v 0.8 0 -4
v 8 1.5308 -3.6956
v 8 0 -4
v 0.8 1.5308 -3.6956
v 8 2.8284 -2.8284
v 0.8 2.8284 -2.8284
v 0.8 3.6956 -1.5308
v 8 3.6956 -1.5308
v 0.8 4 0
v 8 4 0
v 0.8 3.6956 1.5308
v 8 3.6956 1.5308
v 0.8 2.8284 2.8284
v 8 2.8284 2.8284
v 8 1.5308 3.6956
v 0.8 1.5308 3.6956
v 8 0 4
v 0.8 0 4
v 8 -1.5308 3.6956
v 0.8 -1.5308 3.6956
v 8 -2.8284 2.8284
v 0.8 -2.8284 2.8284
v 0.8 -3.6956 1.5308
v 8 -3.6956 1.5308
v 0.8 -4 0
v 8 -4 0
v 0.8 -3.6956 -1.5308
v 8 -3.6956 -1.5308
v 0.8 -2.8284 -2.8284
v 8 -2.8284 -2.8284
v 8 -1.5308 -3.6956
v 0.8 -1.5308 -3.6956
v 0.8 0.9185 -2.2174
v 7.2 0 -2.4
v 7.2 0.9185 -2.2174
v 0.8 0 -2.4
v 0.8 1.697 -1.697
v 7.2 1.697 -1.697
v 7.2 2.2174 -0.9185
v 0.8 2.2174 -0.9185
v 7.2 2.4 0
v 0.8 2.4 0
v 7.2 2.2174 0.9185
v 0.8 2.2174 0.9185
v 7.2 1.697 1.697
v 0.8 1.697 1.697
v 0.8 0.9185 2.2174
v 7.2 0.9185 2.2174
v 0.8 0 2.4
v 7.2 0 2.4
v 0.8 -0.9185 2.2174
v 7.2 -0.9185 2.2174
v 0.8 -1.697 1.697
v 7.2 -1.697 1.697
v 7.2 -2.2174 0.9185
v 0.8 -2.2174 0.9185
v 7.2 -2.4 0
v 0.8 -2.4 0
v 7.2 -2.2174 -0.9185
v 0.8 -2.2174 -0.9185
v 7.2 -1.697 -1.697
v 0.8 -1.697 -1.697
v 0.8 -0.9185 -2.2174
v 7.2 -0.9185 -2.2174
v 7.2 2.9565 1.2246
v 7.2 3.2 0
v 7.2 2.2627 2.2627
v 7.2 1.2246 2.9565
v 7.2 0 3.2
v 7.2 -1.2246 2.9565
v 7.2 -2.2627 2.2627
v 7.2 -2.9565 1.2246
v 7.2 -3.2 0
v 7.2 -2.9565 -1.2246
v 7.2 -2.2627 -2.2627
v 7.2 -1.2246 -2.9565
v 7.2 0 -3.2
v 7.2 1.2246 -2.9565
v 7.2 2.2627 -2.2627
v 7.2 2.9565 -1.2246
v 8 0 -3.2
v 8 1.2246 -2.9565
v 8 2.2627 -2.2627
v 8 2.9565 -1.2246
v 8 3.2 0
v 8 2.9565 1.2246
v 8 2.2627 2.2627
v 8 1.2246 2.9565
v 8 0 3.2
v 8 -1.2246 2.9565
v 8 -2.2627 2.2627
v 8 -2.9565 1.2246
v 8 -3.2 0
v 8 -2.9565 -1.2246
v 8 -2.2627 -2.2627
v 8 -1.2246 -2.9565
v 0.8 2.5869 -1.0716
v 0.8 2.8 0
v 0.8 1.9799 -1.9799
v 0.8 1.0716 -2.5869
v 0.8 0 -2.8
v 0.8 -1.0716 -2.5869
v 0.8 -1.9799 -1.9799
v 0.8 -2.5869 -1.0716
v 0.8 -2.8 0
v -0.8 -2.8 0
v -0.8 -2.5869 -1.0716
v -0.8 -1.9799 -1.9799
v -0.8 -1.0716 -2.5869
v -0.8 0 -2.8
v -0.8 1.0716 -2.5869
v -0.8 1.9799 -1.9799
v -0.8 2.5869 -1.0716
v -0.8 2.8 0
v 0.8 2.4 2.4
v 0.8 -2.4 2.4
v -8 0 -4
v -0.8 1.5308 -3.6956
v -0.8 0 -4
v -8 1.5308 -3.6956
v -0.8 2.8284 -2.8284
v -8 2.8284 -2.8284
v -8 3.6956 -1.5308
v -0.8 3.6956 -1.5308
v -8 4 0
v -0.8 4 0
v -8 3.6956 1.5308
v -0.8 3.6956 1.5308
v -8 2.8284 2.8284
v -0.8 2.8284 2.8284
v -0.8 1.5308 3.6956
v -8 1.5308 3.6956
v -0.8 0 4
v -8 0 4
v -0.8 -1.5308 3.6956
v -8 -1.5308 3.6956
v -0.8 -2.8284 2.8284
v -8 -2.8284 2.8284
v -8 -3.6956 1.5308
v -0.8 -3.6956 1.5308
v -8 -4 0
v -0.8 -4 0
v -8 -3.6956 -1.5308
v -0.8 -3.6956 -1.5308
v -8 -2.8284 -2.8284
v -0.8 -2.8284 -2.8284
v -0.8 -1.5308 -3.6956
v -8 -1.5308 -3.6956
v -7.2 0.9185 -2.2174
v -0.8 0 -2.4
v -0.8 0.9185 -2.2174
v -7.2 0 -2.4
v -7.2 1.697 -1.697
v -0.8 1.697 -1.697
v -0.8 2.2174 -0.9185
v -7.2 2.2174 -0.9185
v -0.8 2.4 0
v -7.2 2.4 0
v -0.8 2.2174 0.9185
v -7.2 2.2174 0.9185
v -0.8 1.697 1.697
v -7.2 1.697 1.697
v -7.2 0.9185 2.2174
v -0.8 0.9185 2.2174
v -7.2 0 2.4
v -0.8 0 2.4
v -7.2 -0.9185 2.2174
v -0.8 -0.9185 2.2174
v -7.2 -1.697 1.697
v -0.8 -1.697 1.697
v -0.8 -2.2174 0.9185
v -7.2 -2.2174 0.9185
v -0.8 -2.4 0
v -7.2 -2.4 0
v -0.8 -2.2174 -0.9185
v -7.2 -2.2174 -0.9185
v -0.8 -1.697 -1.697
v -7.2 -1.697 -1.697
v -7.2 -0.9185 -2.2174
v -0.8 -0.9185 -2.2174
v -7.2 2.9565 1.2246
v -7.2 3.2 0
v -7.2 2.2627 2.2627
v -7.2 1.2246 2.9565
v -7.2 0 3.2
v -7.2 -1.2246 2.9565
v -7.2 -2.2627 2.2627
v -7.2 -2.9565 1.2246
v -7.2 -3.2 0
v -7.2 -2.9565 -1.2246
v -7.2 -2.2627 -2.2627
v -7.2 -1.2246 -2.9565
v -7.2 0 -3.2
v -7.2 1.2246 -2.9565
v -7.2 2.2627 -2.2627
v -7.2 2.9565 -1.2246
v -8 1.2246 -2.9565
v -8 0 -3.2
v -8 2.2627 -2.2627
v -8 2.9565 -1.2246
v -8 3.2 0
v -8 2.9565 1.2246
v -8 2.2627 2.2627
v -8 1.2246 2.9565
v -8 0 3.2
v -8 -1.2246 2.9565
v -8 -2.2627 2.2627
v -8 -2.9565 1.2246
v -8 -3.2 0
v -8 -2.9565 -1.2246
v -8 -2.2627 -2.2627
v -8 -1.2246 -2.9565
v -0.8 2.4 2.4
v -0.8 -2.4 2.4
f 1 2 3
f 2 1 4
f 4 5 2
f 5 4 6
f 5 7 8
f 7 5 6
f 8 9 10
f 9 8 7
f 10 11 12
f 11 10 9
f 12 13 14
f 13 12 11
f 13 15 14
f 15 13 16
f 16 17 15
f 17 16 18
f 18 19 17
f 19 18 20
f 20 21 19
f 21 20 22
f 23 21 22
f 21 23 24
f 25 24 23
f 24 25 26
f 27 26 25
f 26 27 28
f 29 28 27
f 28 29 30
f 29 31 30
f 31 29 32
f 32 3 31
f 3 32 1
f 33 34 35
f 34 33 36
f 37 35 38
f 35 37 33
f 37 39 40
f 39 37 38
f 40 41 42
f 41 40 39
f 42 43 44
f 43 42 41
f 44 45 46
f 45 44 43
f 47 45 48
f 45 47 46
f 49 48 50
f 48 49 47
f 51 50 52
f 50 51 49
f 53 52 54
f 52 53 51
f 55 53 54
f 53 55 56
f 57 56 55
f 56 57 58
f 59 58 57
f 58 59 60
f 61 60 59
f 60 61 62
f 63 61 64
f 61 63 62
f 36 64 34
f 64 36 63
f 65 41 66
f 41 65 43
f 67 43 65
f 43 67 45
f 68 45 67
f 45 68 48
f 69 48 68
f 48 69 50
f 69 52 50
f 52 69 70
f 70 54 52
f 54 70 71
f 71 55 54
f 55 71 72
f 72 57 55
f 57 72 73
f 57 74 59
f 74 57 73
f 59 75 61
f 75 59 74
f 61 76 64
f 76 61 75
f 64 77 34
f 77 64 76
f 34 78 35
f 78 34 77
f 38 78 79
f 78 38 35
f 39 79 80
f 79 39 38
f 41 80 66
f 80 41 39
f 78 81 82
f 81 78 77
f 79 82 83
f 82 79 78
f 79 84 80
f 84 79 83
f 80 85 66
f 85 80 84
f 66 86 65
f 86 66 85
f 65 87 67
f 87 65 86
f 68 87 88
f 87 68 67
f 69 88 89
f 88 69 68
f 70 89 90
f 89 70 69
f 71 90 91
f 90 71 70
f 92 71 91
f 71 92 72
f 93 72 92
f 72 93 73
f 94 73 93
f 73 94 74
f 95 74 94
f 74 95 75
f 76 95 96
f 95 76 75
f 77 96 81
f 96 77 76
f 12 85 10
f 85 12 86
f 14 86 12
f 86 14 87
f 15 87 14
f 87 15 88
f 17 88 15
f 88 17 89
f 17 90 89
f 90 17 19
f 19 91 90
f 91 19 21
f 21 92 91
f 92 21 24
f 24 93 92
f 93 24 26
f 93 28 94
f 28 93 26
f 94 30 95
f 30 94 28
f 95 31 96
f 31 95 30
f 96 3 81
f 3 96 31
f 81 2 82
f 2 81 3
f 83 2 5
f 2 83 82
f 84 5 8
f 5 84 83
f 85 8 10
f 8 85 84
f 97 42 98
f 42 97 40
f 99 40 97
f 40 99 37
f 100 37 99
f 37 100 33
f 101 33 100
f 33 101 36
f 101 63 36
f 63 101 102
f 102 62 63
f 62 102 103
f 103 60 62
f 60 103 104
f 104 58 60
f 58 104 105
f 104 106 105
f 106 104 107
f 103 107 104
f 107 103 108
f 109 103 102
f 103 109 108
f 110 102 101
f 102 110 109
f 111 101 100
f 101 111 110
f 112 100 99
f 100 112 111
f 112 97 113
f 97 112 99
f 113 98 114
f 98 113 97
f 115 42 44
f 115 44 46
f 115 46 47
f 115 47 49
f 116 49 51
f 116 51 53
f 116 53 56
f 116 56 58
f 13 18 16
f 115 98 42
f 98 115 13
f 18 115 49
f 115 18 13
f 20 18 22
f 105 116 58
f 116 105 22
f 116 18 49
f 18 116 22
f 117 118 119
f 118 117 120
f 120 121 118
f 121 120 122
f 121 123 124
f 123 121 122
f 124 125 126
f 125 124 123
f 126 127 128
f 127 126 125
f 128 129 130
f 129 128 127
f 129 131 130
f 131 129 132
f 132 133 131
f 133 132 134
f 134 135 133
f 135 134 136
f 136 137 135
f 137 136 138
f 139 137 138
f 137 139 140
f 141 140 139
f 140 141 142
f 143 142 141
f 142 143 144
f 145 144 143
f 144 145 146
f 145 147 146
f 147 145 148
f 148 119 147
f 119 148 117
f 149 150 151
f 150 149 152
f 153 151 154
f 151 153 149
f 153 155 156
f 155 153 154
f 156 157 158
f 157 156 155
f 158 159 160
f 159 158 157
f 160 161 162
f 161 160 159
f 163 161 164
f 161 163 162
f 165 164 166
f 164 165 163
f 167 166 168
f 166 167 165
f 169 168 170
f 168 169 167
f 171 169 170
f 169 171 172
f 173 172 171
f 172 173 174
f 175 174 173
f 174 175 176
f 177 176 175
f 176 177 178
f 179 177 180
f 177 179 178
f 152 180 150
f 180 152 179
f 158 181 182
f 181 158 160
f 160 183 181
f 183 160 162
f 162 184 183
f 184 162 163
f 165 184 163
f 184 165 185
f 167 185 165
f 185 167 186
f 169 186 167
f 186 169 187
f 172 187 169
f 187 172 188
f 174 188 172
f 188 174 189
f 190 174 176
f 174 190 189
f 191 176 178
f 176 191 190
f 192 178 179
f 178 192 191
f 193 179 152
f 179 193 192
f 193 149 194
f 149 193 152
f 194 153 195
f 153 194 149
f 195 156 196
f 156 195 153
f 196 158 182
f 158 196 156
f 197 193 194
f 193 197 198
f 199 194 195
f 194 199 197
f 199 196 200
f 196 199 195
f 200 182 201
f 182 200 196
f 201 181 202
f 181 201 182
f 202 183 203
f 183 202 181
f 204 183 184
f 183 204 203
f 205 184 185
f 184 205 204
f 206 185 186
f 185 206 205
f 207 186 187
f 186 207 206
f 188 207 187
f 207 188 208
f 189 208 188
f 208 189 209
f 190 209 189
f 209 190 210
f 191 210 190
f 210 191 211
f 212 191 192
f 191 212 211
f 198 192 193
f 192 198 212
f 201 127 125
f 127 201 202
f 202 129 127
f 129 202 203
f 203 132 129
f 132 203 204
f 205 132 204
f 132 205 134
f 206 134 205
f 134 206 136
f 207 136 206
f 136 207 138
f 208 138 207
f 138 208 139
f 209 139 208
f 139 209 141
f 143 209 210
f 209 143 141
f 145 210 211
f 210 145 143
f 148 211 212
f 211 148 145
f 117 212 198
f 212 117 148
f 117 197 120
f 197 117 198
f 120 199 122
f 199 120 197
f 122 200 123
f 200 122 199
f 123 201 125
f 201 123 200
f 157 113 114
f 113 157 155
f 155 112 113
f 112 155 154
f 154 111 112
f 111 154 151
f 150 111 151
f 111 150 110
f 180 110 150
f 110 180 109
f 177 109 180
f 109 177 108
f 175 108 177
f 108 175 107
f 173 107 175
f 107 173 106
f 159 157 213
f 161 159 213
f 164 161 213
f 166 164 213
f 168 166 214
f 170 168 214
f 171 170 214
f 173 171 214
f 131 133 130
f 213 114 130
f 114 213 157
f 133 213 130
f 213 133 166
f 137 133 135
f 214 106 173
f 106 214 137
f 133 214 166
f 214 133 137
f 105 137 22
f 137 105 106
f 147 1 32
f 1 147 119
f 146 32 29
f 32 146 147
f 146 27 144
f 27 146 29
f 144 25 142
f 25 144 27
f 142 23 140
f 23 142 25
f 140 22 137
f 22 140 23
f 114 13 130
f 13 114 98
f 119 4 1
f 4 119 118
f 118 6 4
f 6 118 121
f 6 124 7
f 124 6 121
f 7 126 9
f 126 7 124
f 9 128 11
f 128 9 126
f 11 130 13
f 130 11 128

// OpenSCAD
// file: ../p/4-4ring3.scad
use <../lib.scad>
function ldraw_lib__4_4ring3() = [
// 0 Ring  3 x 1.0
// 0 Name: 4-4ring3.dat
// 0 Author: James Jessiman
// 0 !LDRAW_ORG Primitive UPDATE 2009-01
// 0 !LICENSE Licensed under CC BY 4.0 : see CAreadme.txt
// 
// 0 BFC CERTIFY CCW
  [0,"BFC","CERTIFY"],
  [0,"BFC","CCW"],
// 
// 0 !HISTORY 1998-12-15 [PTadmin] Official Update 1998-10
// 0 !HISTORY 2002-04-05 [hafhead] Added BFC statement
// 0 !HISTORY 2002-04-25 [PTadmin] Official Update 2002-02
// 0 !HISTORY 2007-06-24 [PTadmin] Header formatted for Contributor Agreement
// 0 !HISTORY 2008-07-01 [PTadmin] Official Update 2008-01
// 0 !HISTORY 2008-08-26 [cwdee] Switch polygon winding and rename
// 0 !HISTORY 2009-05-02 [PTadmin] Official Update 2009-01
// 
// 
// 4 16 -1.5308 0 3.6956 -1.1481 0 2.7717 0 0 3 0 0 4
  [4,16,-1.5308,0,3.6956,-1.1481,0,2.7717,0,0,3,0,0,4],
// 4 16 -2.8284 0 2.8284 -2.1213 0 2.1213 -1.1481 0 2.7717 -1.5308 0 3.6956
  [4,16,-2.8284,0,2.8284,-2.1213,0,2.1213,-1.1481,0,2.7717,-1.5308,0,3.6956],
// 4 16 -3.6956 0 1.5308 -2.7717 0 1.1481 -2.1213 0 2.1213 -2.8284 0 2.8284
  [4,16,-3.6956,0,1.5308,-2.7717,0,1.1481,-2.1213,0,2.1213,-2.8284,0,2.8284],
// 4 16 -4 0 0 -3 0 0 -2.7717 0 1.1481 -3.6956 0 1.5308
  [4,16,-4,0,0,-3,0,0,-2.7717,0,1.1481,-3.6956,0,1.5308],
// 4 16 -3.6956 0 -1.5308 -2.7717 0 -1.1481 -3 0 0 -4 0 0
  [4,16,-3.6956,0,-1.5308,-2.7717,0,-1.1481,-3,0,0,-4,0,0],
// 4 16 -2.8284 0 -2.8284 -2.1213 0 -2.1213 -2.7717 0 -1.1481 -3.6956 0 -1.5308
  [4,16,-2.8284,0,-2.8284,-2.1213,0,-2.1213,-2.7717,0,-1.1481,-3.6956,0,-1.5308],
// 4 16 -1.5308 0 -3.6956 -1.1481 0 -2.7717 -2.1213 0 -2.1213 -2.8284 0 -2.8284
  [4,16,-1.5308,0,-3.6956,-1.1481,0,-2.7717,-2.1213,0,-2.1213,-2.8284,0,-2.8284],
// 4 16 0 0 -4 0 0 -3 -1.1481 0 -2.7717 -1.5308 0 -3.6956
  [4,16,0,0,-4,0,0,-3,-1.1481,0,-2.7717,-1.5308,0,-3.6956],
// 4 16 1.5308 0 -3.6956 1.1481 0 -2.7717 0 0 -3 0 0 -4
  [4,16,1.5308,0,-3.6956,1.1481,0,-2.7717,0,0,-3,0,0,-4],
// 4 16 2.8284 0 -2.8284 2.1213 0 -2.1213 1.1481 0 -2.7717 1.5308 0 -3.6956
  [4,16,2.8284,0,-2.8284,2.1213,0,-2.1213,1.1481,0,-2.7717,1.5308,0,-3.6956],
// 4 16 3.6956 0 -1.5308 2.7717 0 -1.1481 2.1213 0 -2.1213 2.8284 0 -2.8284
  [4,16,3.6956,0,-1.5308,2.7717,0,-1.1481,2.1213,0,-2.1213,2.8284,0,-2.8284],
// 4 16 4 0 0 3 0 0 2.7717 0 -1.1481 3.6956 0 -1.5308
  [4,16,4,0,0,3,0,0,2.7717,0,-1.1481,3.6956,0,-1.5308],
// 4 16 3.6956 0 1.5308 2.7717 0 1.1481 3 0 0 4 0 0
  [4,16,3.6956,0,1.5308,2.7717,0,1.1481,3,0,0,4,0,0],
// 4 16 2.8284 0 2.8284 2.1213 0 2.1213 2.7717 0 1.1481 3.6956 0 1.5308
  [4,16,2.8284,0,2.8284,2.1213,0,2.1213,2.7717,0,1.1481,3.6956,0,1.5308],
// 4 16 1.5308 0 3.6956 1.1481 0 2.7717 2.1213 0 2.1213 2.8284 0 2.8284
  [4,16,1.5308,0,3.6956,1.1481,0,2.7717,2.1213,0,2.1213,2.8284,0,2.8284],
// 4 16 0 0 4 0 0 3 1.1481 0 2.7717 1.5308 0 3.6956
  [4,16,0,0,4,0,0,3,1.1481,0,2.7717,1.5308,0,3.6956],
// 0
];
module ldraw_lib__4_4ring3(step=0, col=false, unit=2/5, alt=false, line=0.2, solid=!$preview)
    makepoly(ldraw_lib__4_4ring3(), step=step, col=col, unit=unit, alt=alt, line=line, solid=solid);
ldraw_lib__4_4ring3(line=0.2);
// file: ../p/2-4edge.scad
use <../lib.scad>
function ldraw_lib__2_4edge() = [
// 0 Circle 0.5
// 0 Name: 2-4edge.dat
// 0 Author: James Jessiman
// 0 !LDRAW_ORG Primitive UPDATE 2017-01
// 0 !LICENSE Licensed under CC BY 4.0 : see CAreadme.txt
// 
// 0 BFC CERTIFY CCW
  [0,"BFC","CERTIFY"],
  [0,"BFC","CCW"],
// 
// 0 !HISTORY 2007-06-24 [PTadmin] Header formatted for Contributor Agreement
// 0 !HISTORY 2008-07-01 [PTadmin] Official Update 2008-01
// 0 !HISTORY 2017-01-15 [Steffen] BFCed
// 0 !HISTORY 2017-12-30 [PTadmin] Official Update 2017-01
// 
// 
// 2 24 1 0 0 0.9239 0 0.3827
  [2,24,1,0,0,0.9239,0,0.3827],
// 2 24 0.9239 0 0.3827 0.7071 0 0.7071
  [2,24,0.9239,0,0.3827,0.7071,0,0.7071],
// 2 24 0.7071 0 0.7071 0.3827 0 0.9239
  [2,24,0.7071,0,0.7071,0.3827,0,0.9239],
// 2 24 0.3827 0 0.9239 0 0 1
  [2,24,0.3827,0,0.9239,0,0,1],
// 2 24 0 0 1 -0.3827 0 0.9239
  [2,24,0,0,1,-0.3827,0,0.9239],
// 2 24 -0.3827 0 0.9239 -0.7071 0 0.7071
  [2,24,-0.3827,0,0.9239,-0.7071,0,0.7071],
// 2 24 -0.7071 0 0.7071 -0.9239 0 0.3827
  [2,24,-0.7071,0,0.7071,-0.9239,0,0.3827],
// 2 24 -0.9239 0 0.3827 -1 0 0
  [2,24,-0.9239,0,0.3827,-1,0,0],
];
module ldraw_lib__2_4edge(step=0, col=false, unit=2/5, alt=false, line=0.2, solid=!$preview)
    makepoly(ldraw_lib__2_4edge(), step=step, col=col, unit=unit, alt=alt, line=line, solid=solid);
ldraw_lib__2_4edge(line=0.2);
// file: ../p/2-4cyli.scad
use <../lib.scad>
function ldraw_lib__2_4cyli() = [
// 0 Cylinder 0.5
// 0 Name: 2-4cyli.dat
// 0 Author: James Jessiman
// 0 !LDRAW_ORG Primitive UPDATE 2005-01
// 0 !LICENSE Licensed under CC BY 4.0 : see CAreadme.txt
// 
// 0 BFC CERTIFY CCW
  [0,"BFC","CERTIFY"],
  [0,"BFC","CCW"],
// 
// 0 !HISTORY 2002-03-23 [sbliss] Added BFC statement; compacted code
// 0 !HISTORY 2002-04-25 [PTadmin] Official Update 2002-02
// 0 !HISTORY 2004-12-11 [nielsk] Recreated using Primitive Generator, Edge lines fixed, BFC changed to CCW
// 0 !HISTORY 2005-12-28 [PTadmin] Official Update 2005-01
// 0 !HISTORY 2007-06-24 [PTadmin] Header formatted for Contributor Agreement
// 0 !HISTORY 2008-07-01 [PTadmin] Official Update 2008-01
// 
// 
// 4 16 .9239 1 .3827 .9239 0 .3827 1 0 0 1 1 0
  [4,16,.9239,1,.3827,.9239,0,.3827,1,0,0,1,1,0],
// 4 16 .7071 1 .7071 .7071 0 .7071 .9239 0 .3827 .9239 1 .3827
  [4,16,.7071,1,.7071,.7071,0,.7071,.9239,0,.3827,.9239,1,.3827],
// 4 16 .3827 1 .9239 .3827 0 .9239 .7071 0 .7071 .7071 1 .7071
  [4,16,.3827,1,.9239,.3827,0,.9239,.7071,0,.7071,.7071,1,.7071],
// 4 16 0 1 1 0 0 1 .3827 0 .9239 .3827 1 .9239
  [4,16,0,1,1,0,0,1,.3827,0,.9239,.3827,1,.9239],
// 4 16 -.3827 1 .9239 -.3827 0 .9239 0 0 1 0 1 1
  [4,16,-.3827,1,.9239,-.3827,0,.9239,0,0,1,0,1,1],
// 4 16 -.7071 1 .7071 -.7071 0 .7071 -.3827 0 .9239 -.3827 1 .9239
  [4,16,-.7071,1,.7071,-.7071,0,.7071,-.3827,0,.9239,-.3827,1,.9239],
// 4 16 -.9239 1 .3827 -.9239 0 .3827 -.7071 0 .7071 -.7071 1 .7071
  [4,16,-.9239,1,.3827,-.9239,0,.3827,-.7071,0,.7071,-.7071,1,.7071],
// 4 16 -1 1 0 -1 0 0 -.9239 0 .3827 -.9239 1 .3827
  [4,16,-1,1,0,-1,0,0,-.9239,0,.3827,-.9239,1,.3827],
// 5 24 1 1 0 1 0 0 1 1 -.4142 .9239 1 .3827
  [5,24,1,1,0,1,0,0,1,1,-.4142,.9239,1,.3827],
// 5 24 .9239 1 .3827 .9239 0 .3827 1 1 0 .7071 1 .7071
  [5,24,.9239,1,.3827,.9239,0,.3827,1,1,0,.7071,1,.7071],
// 5 24 .7071 1 .7071 .7071 0 .7071 .9239 1 .3827 .3827 1 .9239
  [5,24,.7071,1,.7071,.7071,0,.7071,.9239,1,.3827,.3827,1,.9239],
// 5 24 .3827 1 .9239 .3827 0 .9239 .7071 1 .7071 0 1 1
  [5,24,.3827,1,.9239,.3827,0,.9239,.7071,1,.7071,0,1,1],
// 5 24 0 1 1 0 0 1 .3827 1 .9239 -.3827 1 .9239
  [5,24,0,1,1,0,0,1,.3827,1,.9239,-.3827,1,.9239],
// 5 24 -.3827 1 .9239 -.3827 0 .9239 0 1 1 -.7071 1 .7071
  [5,24,-.3827,1,.9239,-.3827,0,.9239,0,1,1,-.7071,1,.7071],
// 5 24 -.7071 1 .7071 -.7071 0 .7071 -.3827 1 .9239 -.9239 1 .3827
  [5,24,-.7071,1,.7071,-.7071,0,.7071,-.3827,1,.9239,-.9239,1,.3827],
// 5 24 -.9239 1 .3827 -.9239 0 .3827 -.7071 1 .7071 -1 1 0
  [5,24,-.9239,1,.3827,-.9239,0,.3827,-.7071,1,.7071,-1,1,0],
// 5 24 -1 1 0 -1 0 0 -.9239 1 .3827 -1 1 -.4142
  [5,24,-1,1,0,-1,0,0,-.9239,1,.3827,-1,1,-.4142],
// 0
];
module ldraw_lib__2_4cyli(step=0, col=false, unit=2/5, alt=false, line=0.2, solid=!$preview)
    makepoly(ldraw_lib__2_4cyli(), step=step, col=col, unit=unit, alt=alt, line=line, solid=solid);
ldraw_lib__2_4cyli(line=0.2);
// file: ../p/rect3.scad
use <../lib.scad>
function ldraw_lib__rect3() = [
// 0 Rectangle with 3 Edges
// 0 Name: rect3.dat
// 0 Author: Mark Kennedy [mkennedy]
// 0 !LDRAW_ORG Primitive UPDATE 2010-01
// 0 !LICENSE Licensed under CC BY 4.0 : see CAreadme.txt
// 
// 0 BFC CERTIFY CCW
  [0,"BFC","CERTIFY"],
  [0,"BFC","CCW"],
// 
// 0 !HISTORY 2003-08-01 [PTadmin] Official Update 2003-02
// 0 !HISTORY 2007-06-24 [PTadmin] Header formatted for Contributor Agreement
// 0 !HISTORY 2008-07-01 [PTadmin] Official Update 2008-01
// 0 !HISTORY 2010-01-17 [mikeheide] Change winding to CCW
// 0 !HISTORY 2010-04-05 [PTadmin] Official Update 2010-01
// 
// 
// 2 24 1 0 1 -1 0 1
  [2,24,1,0,1,-1,0,1],
// 2 24 1 0 1 1 0 -1
  [2,24,1,0,1,1,0,-1],
// 2 24 -1 0 1 -1 0 -1
  [2,24,-1,0,1,-1,0,-1],
// 4 16 -1 0 1 -1 0 -1 1 0 -1 1 0 1
  [4,16,-1,0,1,-1,0,-1,1,0,-1,1,0,1],
// 0 //
];
module ldraw_lib__rect3(step=0, col=false, unit=2/5, alt=false, line=0.2, solid=!$preview)
    makepoly(ldraw_lib__rect3(), step=step, col=col, unit=unit, alt=alt, line=line, solid=solid);
ldraw_lib__rect3(line=0.2);
// file: ../p/peghole.scad
use <../lib.scad>
use <4-4cyli.scad>
use <4-4edge.scad>
use <4-4ring3.scad>
function ldraw_lib__peghole() = [
// 0 Peg Hole End
// 0 Name: peghole.dat
// 0 Author: James Jessiman
// 0 !LDRAW_ORG Primitive UPDATE 2010-01
// 0 !LICENSE Licensed under CC BY 4.0 : see CAreadme.txt
// 
// 0 BFC CERTIFY CCW
  [0,"BFC","CERTIFY"],
  [0,"BFC","CCW"],
// 
// 0 !HISTORY 2002-05-01 [mkennedy] replace code with ring3
// 0 !HISTORY 2002-05-01 [sbliss] BFC
// 0 !HISTORY 2002-06-11 [PTadmin] Official Update 2002-03
// 0 !HISTORY 2007-06-24 [PTadmin] Header formatted for Contributor Agreement
// 0 !HISTORY 2008-07-01 [PTadmin] Official Update 2008-01
// 0 !HISTORY 2010-01-14 [cwdee] Update ring3 to 4-4ring3
// 0 !HISTORY 2010-04-05 [PTadmin] Official Update 2010-01
// 
// 
// 1 16 0 0 0 8 0 0 0 1 0 0 0 8 4-4edge.dat
  [1,16,0,0,0,8,0,0,0,1,0,0,0,8, ldraw_lib__4_4edge()],
// 1 16 0 2 0 8 0 0 0 1 0 0 0 8 4-4edge.dat
  [1,16,0,2,0,8,0,0,0,1,0,0,0,8, ldraw_lib__4_4edge()],
// 1 16 0 2 0 6 0 0 0 1 0 0 0 6 4-4edge.dat
  [1,16,0,2,0,6,0,0,0,1,0,0,0,6, ldraw_lib__4_4edge()],
// 1 16 0 2 0 2 0 0 0 1 0 0 0 2 4-4ring3.dat
  [1,16,0,2,0,2,0,0,0,1,0,0,0,2, ldraw_lib__4_4ring3()],
// 0 BFC INVERTNEXT
  [0,"BFC","INVERTNEXT"],
// 1 16 0 0 0 8 0 0 0 2 0 0 0 8 4-4cyli.dat
  [1,16,0,0,0,8,0,0,0,2,0,0,0,8, ldraw_lib__4_4cyli()],
// 0
];
module ldraw_lib__peghole(step=0, col=false, unit=2/5, alt=false, line=0.2, solid=!$preview)
    makepoly(ldraw_lib__peghole(), step=step, col=col, unit=unit, alt=alt, line=line, solid=solid);
ldraw_lib__peghole(line=0.2);
// file: ../p/4-4ring4.scad
use <../lib.scad>
function ldraw_lib__4_4ring4() = [
// 0 Ring  4 x 1.0
// 0 Name: 4-4ring4.dat
// 0 Author: James Jessiman
// 0 !LDRAW_ORG Primitive UPDATE 2009-01
// 0 !LICENSE Licensed under CC BY 4.0 : see CAreadme.txt
// 
// 0 BFC CERTIFY CCW
  [0,"BFC","CERTIFY"],
  [0,"BFC","CCW"],
// 
// 0 !HISTORY 1998-12-15 [PTadmin] Official Update 1998-10
// 0 !HISTORY 2002-04-08 [BrickCaster] Modified for BFC compliance
// 0 !HISTORY 2002-04-25 [PTadmin] Official Update 2002-02
// 0 !HISTORY 2007-06-24 [PTadmin] Header formatted for Contributor Agreement
// 0 !HISTORY 2008-07-01 [PTadmin] Official Update 2008-01
// 0 !HISTORY 2008-08-26 [cwdee] Switch polygon winding and rename
// 0 !HISTORY 2009-05-02 [PTadmin] Official Update 2009-01
// 
// 
// 4 16 -1.9135 0 4.6195 -1.5308 0 3.6956 0 0 4 0 0 5
  [4,16,-1.9135,0,4.6195,-1.5308,0,3.6956,0,0,4,0,0,5],
// 4 16 -3.5355 0 3.5355 -2.8284 0 2.8284 -1.5308 0 3.6956 -1.9135 0 4.6195
  [4,16,-3.5355,0,3.5355,-2.8284,0,2.8284,-1.5308,0,3.6956,-1.9135,0,4.6195],
// 4 16 -4.6195 0 1.9135 -3.6956 0 1.5308 -2.8284 0 2.8284 -3.5355 0 3.5355
  [4,16,-4.6195,0,1.9135,-3.6956,0,1.5308,-2.8284,0,2.8284,-3.5355,0,3.5355],
// 4 16 -5 0 0 -4 0 0 -3.6956 0 1.5308 -4.6195 0 1.9135
  [4,16,-5,0,0,-4,0,0,-3.6956,0,1.5308,-4.6195,0,1.9135],
// 4 16 -4.6195 0 -1.9135 -3.6956 0 -1.5308 -4 0 0 -5 0 0
  [4,16,-4.6195,0,-1.9135,-3.6956,0,-1.5308,-4,0,0,-5,0,0],
// 4 16 -3.5355 0 -3.5355 -2.8284 0 -2.8284 -3.6956 0 -1.5308 -4.6195 0 -1.9135
  [4,16,-3.5355,0,-3.5355,-2.8284,0,-2.8284,-3.6956,0,-1.5308,-4.6195,0,-1.9135],
// 4 16 -1.9135 0 -4.6195 -1.5308 0 -3.6956 -2.8284 0 -2.8284 -3.5355 0 -3.5355
  [4,16,-1.9135,0,-4.6195,-1.5308,0,-3.6956,-2.8284,0,-2.8284,-3.5355,0,-3.5355],
// 4 16 0 0 -5 0 0 -4 -1.5308 0 -3.6956 -1.9135 0 -4.6195
  [4,16,0,0,-5,0,0,-4,-1.5308,0,-3.6956,-1.9135,0,-4.6195],
// 4 16 1.9135 0 -4.6195 1.5308 0 -3.6956 0 0 -4 0 0 -5
  [4,16,1.9135,0,-4.6195,1.5308,0,-3.6956,0,0,-4,0,0,-5],
// 4 16 3.5355 0 -3.5355 2.8284 0 -2.8284 1.5308 0 -3.6956 1.9135 0 -4.6195
  [4,16,3.5355,0,-3.5355,2.8284,0,-2.8284,1.5308,0,-3.6956,1.9135,0,-4.6195],
// 4 16 4.6195 0 -1.9135 3.6956 0 -1.5308 2.8284 0 -2.8284 3.5355 0 -3.5355
  [4,16,4.6195,0,-1.9135,3.6956,0,-1.5308,2.8284,0,-2.8284,3.5355,0,-3.5355],
// 4 16 5 0 0 4 0 0 3.6956 0 -1.5308 4.6195 0 -1.9135
  [4,16,5,0,0,4,0,0,3.6956,0,-1.5308,4.6195,0,-1.9135],
// 4 16 4.6195 0 1.9135 3.6956 0 1.5308 4 0 0 5 0 0
  [4,16,4.6195,0,1.9135,3.6956,0,1.5308,4,0,0,5,0,0],
// 4 16 3.5355 0 3.5355 2.8284 0 2.8284 3.6956 0 1.5308 4.6195 0 1.9135
  [4,16,3.5355,0,3.5355,2.8284,0,2.8284,3.6956,0,1.5308,4.6195,0,1.9135],
// 4 16 1.9135 0 4.6195 1.5308 0 3.6956 2.8284 0 2.8284 3.5355 0 3.5355
  [4,16,1.9135,0,4.6195,1.5308,0,3.6956,2.8284,0,2.8284,3.5355,0,3.5355],
// 4 16 0 0 5 0 0 4 1.5308 0 3.6956 1.9135 0 4.6195
  [4,16,0,0,5,0,0,4,1.5308,0,3.6956,1.9135,0,4.6195],
// 0
];
module ldraw_lib__4_4ring4(step=0, col=false, unit=2/5, alt=false, line=0.2, solid=!$preview)
    makepoly(ldraw_lib__4_4ring4(), step=step, col=col, unit=unit, alt=alt, line=line, solid=solid);
ldraw_lib__4_4ring4(line=0.2);
// file: ../p/4-4edge.scad
use <../lib.scad>
function ldraw_lib__4_4edge() = [
// 0 Circle 1.0
// 0 Name: 4-4edge.dat
// 0 Author: James Jessiman
// 0 !LDRAW_ORG Primitive UPDATE 2017-01
// 0 !LICENSE Licensed under CC BY 4.0 : see CAreadme.txt
// 
// 0 BFC CERTIFY CCW
  [0,"BFC","CERTIFY"],
  [0,"BFC","CCW"],
// 
// 0 !HISTORY 1998-12-15 [PTadmin] Official Update 1998-10
// 0 !HISTORY 2005-12-28 [PTadmin] Official Update 2005-01
// 0 !HISTORY 2007-06-24 [PTadmin] Header formatted for Contributor Agreement
// 0 !HISTORY 2008-07-01 [PTadmin] Official Update 2008-01
// 0 !HISTORY 2017-01-15 [Steffen] BFCed
// 0 !HISTORY 2017-12-30 [PTadmin] Official Update 2017-01
// 
// 
// 2 24 1 0 0 0.9239 0 0.3827
  [2,24,1,0,0,0.9239,0,0.3827],
// 2 24 0.9239 0 0.3827 0.7071 0 0.7071
  [2,24,0.9239,0,0.3827,0.7071,0,0.7071],
// 2 24 0.7071 0 0.7071 0.3827 0 0.9239
  [2,24,0.7071,0,0.7071,0.3827,0,0.9239],
// 2 24 0.3827 0 0.9239 0 0 1
  [2,24,0.3827,0,0.9239,0,0,1],
// 2 24 0 0 1 -0.3827 0 0.9239
  [2,24,0,0,1,-0.3827,0,0.9239],
// 2 24 -0.3827 0 0.9239 -0.7071 0 0.7071
  [2,24,-0.3827,0,0.9239,-0.7071,0,0.7071],
// 2 24 -0.7071 0 0.7071 -0.9239 0 0.3827
  [2,24,-0.7071,0,0.7071,-0.9239,0,0.3827],
// 2 24 -0.9239 0 0.3827 -1 0 -0
  [2,24,-0.9239,0,0.3827,-1,0,-0],
// 2 24 -1 0 -0 -0.9239 0 -0.3827
  [2,24,-1,0,-0,-0.9239,0,-0.3827],
// 2 24 -0.9239 0 -0.3827 -0.7071 0 -0.7071
  [2,24,-0.9239,0,-0.3827,-0.7071,0,-0.7071],
// 2 24 -0.7071 0 -0.7071 -0.3827 0 -0.9239
  [2,24,-0.7071,0,-0.7071,-0.3827,0,-0.9239],
// 2 24 -0.3827 0 -0.9239 0 0 -1
  [2,24,-0.3827,0,-0.9239,0,0,-1],
// 2 24 0 0 -1 0.3827 0 -0.9239
  [2,24,0,0,-1,0.3827,0,-0.9239],
// 2 24 0.3827 0 -0.9239 0.7071 0 -0.7071
  [2,24,0.3827,0,-0.9239,0.7071,0,-0.7071],
// 2 24 0.7071 0 -0.7071 0.9239 0 -0.3827
  [2,24,0.7071,0,-0.7071,0.9239,0,-0.3827],
// 2 24 0.9239 0 -0.3827 1 0 0
  [2,24,0.9239,0,-0.3827,1,0,0],
];
module ldraw_lib__4_4edge(step=0, col=false, unit=2/5, alt=false, line=0.2, solid=!$preview)
    makepoly(ldraw_lib__4_4edge(), step=step, col=col, unit=unit, alt=alt, line=line, solid=solid);
ldraw_lib__4_4edge(line=0.2);
// file: ../p/4-4cyli.scad
use <../lib.scad>
function ldraw_lib__4_4cyli() = [
// 0 Cylinder 1.0
// 0 Name: 4-4cyli.dat
// 0 Author: James Jessiman
// 0 !LDRAW_ORG Primitive UPDATE 2005-01
// 0 !LICENSE Licensed under CC BY 4.0 : see CAreadme.txt
// 
// 0 BFC CERTIFY CCW
  [0,"BFC","CERTIFY"],
  [0,"BFC","CCW"],
// 
// 0 !HISTORY 1998-12-15 [PTadmin] Official Update 1998-10
// 0 !HISTORY 2002-03-23 [sbliss] Added BFC statement; merged headers from files in distributions LDraw 0.27 and Complete.
// 0 !HISTORY 2002-04-25 [PTadmin] Official Update 2002-02
// 0 !HISTORY 2004-12-14 [guyvivan] BFC CCW
// 0 !HISTORY 2005-12-28 [PTadmin] Official Update 2005-01
// 0 !HISTORY 2007-06-24 [PTadmin] Header formatted for Contributor Agreement
// 0 !HISTORY 2008-07-01 [PTadmin] Official Update 2008-01
// 
// 
// 4 16 1 1 0 0.9239 1 0.3827 0.9239 0 0.3827 1 0 0
  [4,16,1,1,0,0.9239,1,0.3827,0.9239,0,0.3827,1,0,0],
// 5 24 1 0 0 1 1 0 0.9239 0 0.3827 0.9239 0 -0.3827
  [5,24,1,0,0,1,1,0,0.9239,0,0.3827,0.9239,0,-0.3827],
// 4 16 0.9239 1 0.3827 0.7071 1 0.7071 0.7071 0 0.7071 0.9239 0 0.3827
  [4,16,0.9239,1,0.3827,0.7071,1,0.7071,0.7071,0,0.7071,0.9239,0,0.3827],
// 5 24 0.9239 0 0.3827 0.9239 1 0.3827 0.7071 0 0.7071 1 0 0
  [5,24,0.9239,0,0.3827,0.9239,1,0.3827,0.7071,0,0.7071,1,0,0],
// 4 16 0.7071 1 0.7071 0.3827 1 0.9239 0.3827 0 0.9239 0.7071 0 0.7071
  [4,16,0.7071,1,0.7071,0.3827,1,0.9239,0.3827,0,0.9239,0.7071,0,0.7071],
// 5 24 0.7071 0 0.7071 0.7071 1 0.7071 0.3827 0 0.9239 0.9239 0 0.3827
  [5,24,0.7071,0,0.7071,0.7071,1,0.7071,0.3827,0,0.9239,0.9239,0,0.3827],
// 4 16 0.3827 1 0.9239 0 1 1 0 0 1 0.3827 0 0.9239
  [4,16,0.3827,1,0.9239,0,1,1,0,0,1,0.3827,0,0.9239],
// 5 24 0.3827 0 0.9239 0.3827 1 0.9239 0 0 1 0.7071 0 0.7071
  [5,24,0.3827,0,0.9239,0.3827,1,0.9239,0,0,1,0.7071,0,0.7071],
// 4 16 0 1 1 -0.3827 1 0.9239 -0.3827 0 0.9239 0 0 1
  [4,16,0,1,1,-0.3827,1,0.9239,-0.3827,0,0.9239,0,0,1],
// 5 24 0 0 1 0 1 1 -0.3827 0 0.9239 0.3827 0 0.9239
  [5,24,0,0,1,0,1,1,-0.3827,0,0.9239,0.3827,0,0.9239],
// 4 16 -0.3827 1 0.9239 -0.7071 1 0.7071 -0.7071 0 0.7071 -0.3827 0 0.9239
  [4,16,-0.3827,1,0.9239,-0.7071,1,0.7071,-0.7071,0,0.7071,-0.3827,0,0.9239],
// 5 24 -0.3827 0 0.9239 -0.3827 1 0.9239 -0.7071 0 0.7071 0 0 1
  [5,24,-0.3827,0,0.9239,-0.3827,1,0.9239,-0.7071,0,0.7071,0,0,1],
// 4 16 -0.7071 1 0.7071 -0.9239 1 0.3827 -0.9239 0 0.3827 -0.7071 0 0.7071
  [4,16,-0.7071,1,0.7071,-0.9239,1,0.3827,-0.9239,0,0.3827,-0.7071,0,0.7071],
// 5 24 -0.7071 0 0.7071 -0.7071 1 0.7071 -0.9239 0 0.3827 -0.3827 0 0.9239
  [5,24,-0.7071,0,0.7071,-0.7071,1,0.7071,-0.9239,0,0.3827,-0.3827,0,0.9239],
// 4 16 -0.9239 1 0.3827 -1 1 0 -1 0 0 -0.9239 0 0.3827
  [4,16,-0.9239,1,0.3827,-1,1,0,-1,0,0,-0.9239,0,0.3827],
// 5 24 -0.9239 0 0.3827 -0.9239 1 0.3827 -1 0 0 -0.7071 0 0.7071
  [5,24,-0.9239,0,0.3827,-0.9239,1,0.3827,-1,0,0,-0.7071,0,0.7071],
// 4 16 -1 1 0 -0.9239 1 -0.3827 -0.9239 0 -0.3827 -1 0 0
  [4,16,-1,1,0,-0.9239,1,-0.3827,-0.9239,0,-0.3827,-1,0,0],
// 5 24 -1 0 0 -1 1 0 -0.9239 0 -0.3827 -0.9239 0 0.3827
  [5,24,-1,0,0,-1,1,0,-0.9239,0,-0.3827,-0.9239,0,0.3827],
// 4 16 -0.9239 1 -0.3827 -0.7071 1 -0.7071 -0.7071 0 -0.7071 -0.9239 0 -0.3827
  [4,16,-0.9239,1,-0.3827,-0.7071,1,-0.7071,-0.7071,0,-0.7071,-0.9239,0,-0.3827],
// 5 24 -0.9239 0 -0.3827 -0.9239 1 -0.3827 -0.7071 0 -0.7071 -1 0 0
  [5,24,-0.9239,0,-0.3827,-0.9239,1,-0.3827,-0.7071,0,-0.7071,-1,0,0],
// 4 16 -0.7071 1 -0.7071 -0.3827 1 -0.9239 -0.3827 0 -0.9239 -0.7071 0 -0.7071
  [4,16,-0.7071,1,-0.7071,-0.3827,1,-0.9239,-0.3827,0,-0.9239,-0.7071,0,-0.7071],
// 5 24 -0.7071 0 -0.7071 -0.7071 1 -0.7071 -0.3827 0 -0.9239 -0.9239 0 -0.3827
  [5,24,-0.7071,0,-0.7071,-0.7071,1,-0.7071,-0.3827,0,-0.9239,-0.9239,0,-0.3827],
// 4 16 -0.3827 1 -0.9239 0 1 -1 0 0 -1 -0.3827 0 -0.9239
  [4,16,-0.3827,1,-0.9239,0,1,-1,0,0,-1,-0.3827,0,-0.9239],
// 5 24 -0.3827 0 -0.9239 -0.3827 1 -0.9239 0 0 -1 -0.7071 0 -0.7071
  [5,24,-0.3827,0,-0.9239,-0.3827,1,-0.9239,0,0,-1,-0.7071,0,-0.7071],
// 4 16 0 1 -1 0.3827 1 -0.9239 0.3827 0 -0.9239 0 0 -1
  [4,16,0,1,-1,0.3827,1,-0.9239,0.3827,0,-0.9239,0,0,-1],
// 5 24 0 0 -1 0 1 -1 0.3827 0 -0.9239 -0.3827 0 -0.9239
  [5,24,0,0,-1,0,1,-1,0.3827,0,-0.9239,-0.3827,0,-0.9239],
// 4 16 0.3827 1 -0.9239 0.7071 1 -0.7071 0.7071 0 -0.7071 0.3827 0 -0.9239
  [4,16,0.3827,1,-0.9239,0.7071,1,-0.7071,0.7071,0,-0.7071,0.3827,0,-0.9239],
// 5 24 0.3827 0 -0.9239 0.3827 1 -0.9239 0.7071 0 -0.7071 0 0 -1
  [5,24,0.3827,0,-0.9239,0.3827,1,-0.9239,0.7071,0,-0.7071,0,0,-1],
// 4 16 0.7071 1 -0.7071 0.9239 1 -0.3827 0.9239 0 -0.3827 0.7071 0 -0.7071
  [4,16,0.7071,1,-0.7071,0.9239,1,-0.3827,0.9239,0,-0.3827,0.7071,0,-0.7071],
// 5 24 0.7071 0 -0.7071 0.7071 1 -0.7071 0.9239 0 -0.3827 0.3827 0 -0.9239
  [5,24,0.7071,0,-0.7071,0.7071,1,-0.7071,0.9239,0,-0.3827,0.3827,0,-0.9239],
// 4 16 0.9239 1 -0.3827 1 1 0 1 0 0 0.9239 0 -0.3827
  [4,16,0.9239,1,-0.3827,1,1,0,1,0,0,0.9239,0,-0.3827],
// 5 24 0.9239 0 -0.3827 0.9239 1 -0.3827 1 0 0 0.7071 0 -0.7071
  [5,24,0.9239,0,-0.3827,0.9239,1,-0.3827,1,0,0,0.7071,0,-0.7071],
// 0
];
module ldraw_lib__4_4cyli(step=0, col=false, unit=2/5, alt=false, line=0.2, solid=!$preview)
    makepoly(ldraw_lib__4_4cyli(), step=step, col=col, unit=unit, alt=alt, line=line, solid=solid);
ldraw_lib__4_4cyli(line=0.2);
// file: ../p/3-8cyli.scad
use <../lib.scad>
function ldraw_lib__3_8cyli() = [
// 0 Cylinder 0.375
// 0 Name: 3-8cyli.dat
// 0 Author: James Jessiman
// 0 !LDRAW_ORG Primitive UPDATE 2005-01
// 0 !LICENSE Licensed under CC BY 4.0 : see CAreadme.txt
// 
// 0 BFC CERTIFY CCW
  [0,"BFC","CERTIFY"],
  [0,"BFC","CCW"],
// 
// 0 !HISTORY 2002-05-08 [OrionP] Made BFC compliant
// 0 !HISTORY 2002-08-18 [PTadmin] Official Update 2002-04
// 0 !HISTORY 2004-12-11 [nielsk] Recreated using Primitive Generator, Edge lines fixed, BFC changed to CCW
// 0 !HISTORY 2005-12-28 [PTadmin] Official Update 2005-01
// 0 !HISTORY 2007-06-24 [PTadmin] Header formatted for Contributor Agreement
// 0 !HISTORY 2008-07-01 [PTadmin] Official Update 2008-01
// 
// 
// 4 16 .9239 1 .3827 .9239 0 .3827 1 0 0 1 1 0
  [4,16,.9239,1,.3827,.9239,0,.3827,1,0,0,1,1,0],
// 4 16 .7071 1 .7071 .7071 0 .7071 .9239 0 .3827 .9239 1 .3827
  [4,16,.7071,1,.7071,.7071,0,.7071,.9239,0,.3827,.9239,1,.3827],
// 4 16 .3827 1 .9239 .3827 0 .9239 .7071 0 .7071 .7071 1 .7071
  [4,16,.3827,1,.9239,.3827,0,.9239,.7071,0,.7071,.7071,1,.7071],
// 4 16 0 1 1 0 0 1 .3827 0 .9239 .3827 1 .9239
  [4,16,0,1,1,0,0,1,.3827,0,.9239,.3827,1,.9239],
// 4 16 -.3827 1 .9239 -.3827 0 .9239 0 0 1 0 1 1
  [4,16,-.3827,1,.9239,-.3827,0,.9239,0,0,1,0,1,1],
// 4 16 -.7071 1 .7071 -.7071 0 .7071 -.3827 0 .9239 -.3827 1 .9239
  [4,16,-.7071,1,.7071,-.7071,0,.7071,-.3827,0,.9239,-.3827,1,.9239],
// 5 24 1 1 0 1 0 0 1 1 -.4142 .9239 1 .3827
  [5,24,1,1,0,1,0,0,1,1,-.4142,.9239,1,.3827],
// 5 24 .9239 1 .3827 .9239 0 .3827 1 1 0 .7071 1 .7071
  [5,24,.9239,1,.3827,.9239,0,.3827,1,1,0,.7071,1,.7071],
// 5 24 .7071 1 .7071 .7071 0 .7071 .9239 1 .3827 .3827 1 .9239
  [5,24,.7071,1,.7071,.7071,0,.7071,.9239,1,.3827,.3827,1,.9239],
// 5 24 .3827 1 .9239 .3827 0 .9239 .7071 1 .7071 0 1 1
  [5,24,.3827,1,.9239,.3827,0,.9239,.7071,1,.7071,0,1,1],
// 5 24 0 1 1 0 0 1 .3827 1 .9239 -.3827 1 .9239
  [5,24,0,1,1,0,0,1,.3827,1,.9239,-.3827,1,.9239],
// 5 24 -.3827 1 .9239 -.3827 0 .9239 0 1 1 -.7071 1 .7071
  [5,24,-.3827,1,.9239,-.3827,0,.9239,0,1,1,-.7071,1,.7071],
// 5 24 -.7071 1 .7071 -.7071 0 .7071 -.3827 1 .9239 -1 1 .4142
  [5,24,-.7071,1,.7071,-.7071,0,.7071,-.3827,1,.9239,-1,1,.4142],
// 0
];
module ldraw_lib__3_8cyli(step=0, col=false, unit=2/5, alt=false, line=0.2, solid=!$preview)
    makepoly(ldraw_lib__3_8cyli(), step=step, col=col, unit=unit, alt=alt, line=line, solid=solid);
ldraw_lib__3_8cyli(line=0.2);
// file: ../p/2-4ring6.scad
use <../lib.scad>
function ldraw_lib__2_4ring6() = [
// 0 Ring  6 x 0.5
// 0 Name: 2-4ring6.dat
// 0 Author: Niels Karsdorp [nielsk]
// 0 !LDRAW_ORG Primitive UPDATE 2012-01
// 0 !LICENSE Licensed under CC BY 4.0 : see CAreadme.txt
// 
// 0 BFC CERTIFY CCW
  [0,"BFC","CERTIFY"],
  [0,"BFC","CCW"],
// 
// 0 !HISTORY 2004-09-15 [PTadmin] Official Update 2004-03
// 0 !HISTORY 2007-06-24 [PTadmin] Header formatted for Contributor Agreement
// 0 !HISTORY 2008-07-01 [PTadmin] Official Update 2008-01
// 0 !HISTORY 2012-02-16 [Philo] Changed to CCW
// 0 !HISTORY 2012-03-30 [PTadmin] Official Update 2012-01
// 
// 
// 4 16 7 0 0 6.4673 0 2.6789 5.5434 0 2.2962 6 0 0
  [4,16,7,0,0,6.4673,0,2.6789,5.5434,0,2.2962,6,0,0],
// 4 16 6.4673 0 2.6789 4.9497 0 4.9497 4.2426 0 4.2426 5.5434 0 2.2962
  [4,16,6.4673,0,2.6789,4.9497,0,4.9497,4.2426,0,4.2426,5.5434,0,2.2962],
// 4 16 4.9497 0 4.9497 2.6789 0 6.4673 2.2962 0 5.5434 4.2426 0 4.2426
  [4,16,4.9497,0,4.9497,2.6789,0,6.4673,2.2962,0,5.5434,4.2426,0,4.2426],
// 4 16 2.6789 0 6.4673 0 0 7 0 0 6 2.2962 0 5.5434
  [4,16,2.6789,0,6.4673,0,0,7,0,0,6,2.2962,0,5.5434],
// 4 16 0 0 7 -2.6789 0 6.4673 -2.2962 0 5.5434 0 0 6
  [4,16,0,0,7,-2.6789,0,6.4673,-2.2962,0,5.5434,0,0,6],
// 4 16 -2.6789 0 6.4673 -4.9497 0 4.9497 -4.2426 0 4.2426 -2.2962 0 5.5434
  [4,16,-2.6789,0,6.4673,-4.9497,0,4.9497,-4.2426,0,4.2426,-2.2962,0,5.5434],
// 4 16 -4.9497 0 4.9497 -6.4673 0 2.6789 -5.5434 0 2.2962 -4.2426 0 4.2426
  [4,16,-4.9497,0,4.9497,-6.4673,0,2.6789,-5.5434,0,2.2962,-4.2426,0,4.2426],
// 4 16 -6.4673 0 2.6789 -7 0 0 -6 0 0 -5.5434 0 2.2962
  [4,16,-6.4673,0,2.6789,-7,0,0,-6,0,0,-5.5434,0,2.2962],
];
module ldraw_lib__2_4ring6(step=0, col=false, unit=2/5, alt=false, line=0.2, solid=!$preview)
    makepoly(ldraw_lib__2_4ring6(), step=step, col=col, unit=unit, alt=alt, line=line, solid=solid);
ldraw_lib__2_4ring6(line=0.2);
// file: ../p/2-4ndis.scad
use <../lib.scad>
function ldraw_lib__2_4ndis() = [
// 0 Disc Negative 0.5
// 0 Name: 2-4ndis.dat
// 0 Author: James Jessiman
// 0 !LDRAW_ORG Primitive UPDATE 2012-01
// 0 !LICENSE Licensed under CC BY 4.0 : see CAreadme.txt
// 
// 0 BFC CERTIFY CCW
  [0,"BFC","CERTIFY"],
  [0,"BFC","CCW"],
// 
// 0 !HISTORY 2002-03-23 [sbliss] Added BFC statement; compacted code
// 0 !HISTORY 2002-04-25 [PTadmin] Official Update 2002-02
// 0 !HISTORY 2007-06-24 [PTadmin] Header formatted for Contributor Agreement
// 0 !HISTORY 2008-07-01 [PTadmin] Official Update 2008-01
// 0 !HISTORY 2012-02-16 [Philo] Changed to CCW
// 0 !HISTORY 2012-03-30 [PTadmin] Official Update 2012-01
// 
// 
// 3 16 0.9239 0 0.3827 1 0 0 1 0 1
  [3,16,0.9239,0,0.3827,1,0,0,1,0,1],
// 3 16 0.7071 0 0.7071 0.9239 0 0.3827 1 0 1
  [3,16,0.7071,0,0.7071,0.9239,0,0.3827,1,0,1],
// 3 16 0.3827 0 0.9239 0.7071 0 0.7071 1 0 1
  [3,16,0.3827,0,0.9239,0.7071,0,0.7071,1,0,1],
// 3 16 0 0 1 0.3827 0 0.9239 1 0 1
  [3,16,0,0,1,0.3827,0,0.9239,1,0,1],
// 3 16 -0.3827 0 0.9239 0 0 1 -1 0 1
  [3,16,-0.3827,0,0.9239,0,0,1,-1,0,1],
// 3 16 -0.7071 0 0.7071 -0.3827 0 0.9239 -1 0 1
  [3,16,-0.7071,0,0.7071,-0.3827,0,0.9239,-1,0,1],
// 3 16 -0.9239 0 0.3827 -0.7071 0 0.7071 -1 0 1
  [3,16,-0.9239,0,0.3827,-0.7071,0,0.7071,-1,0,1],
// 3 16 -1 0 0 -0.9239 0 0.3827 -1 0 1
  [3,16,-1,0,0,-0.9239,0,0.3827,-1,0,1],
];
module ldraw_lib__2_4ndis(step=0, col=false, unit=2/5, alt=false, line=0.2, solid=!$preview)
    makepoly(ldraw_lib__2_4ndis(), step=step, col=col, unit=unit, alt=alt, line=line, solid=solid);
ldraw_lib__2_4ndis(line=0.2);
// file: ../p/2-4cylo.scad
use <../lib.scad>
use <2-4cyli.scad>
use <2-4edge.scad>
function ldraw_lib__2_4cylo() = [
// 0 Cylinder Open 0.5
// 0 Name: 2-4cylo.dat
// 0 Author: Max Martin Richter [MMR1988]
// 0 !LDRAW_ORG Primitive UPDATE 2010-03
// 0 !LICENSE Licensed under CC BY 4.0 : see CAreadme.txt
// 
// 0 BFC CERTIFY CCW
  [0,"BFC","CERTIFY"],
  [0,"BFC","CCW"],
// 
// 0 !HISTORY 2010-12-31 [PTadmin] Official Update 2010-03
// 
// 
// 1 16 0 0 0 1 0 0 0 1 0 0 0 1 2-4edge.dat
  [1,16,0,0,0,1,0,0,0,1,0,0,0,1, ldraw_lib__2_4edge()],
// 1 16 0 1 0 1 0 0 0 1 0 0 0 1 2-4edge.dat
  [1,16,0,1,0,1,0,0,0,1,0,0,0,1, ldraw_lib__2_4edge()],
// 1 16 0 0 0 1 0 0 0 1 0 0 0 1 2-4cyli.dat
  [1,16,0,0,0,1,0,0,0,1,0,0,0,1, ldraw_lib__2_4cyli()],
];
module ldraw_lib__2_4cylo(step=0, col=false, unit=2/5, alt=false, line=0.2, solid=!$preview)
    makepoly(ldraw_lib__2_4cylo(), step=step, col=col, unit=unit, alt=alt, line=line, solid=solid);
ldraw_lib__2_4cylo(line=0.2);
// file: ../p/1-8edge.scad
use <../lib.scad>
function ldraw_lib__1_8edge() = [
// 0 Circle 0.125
// 0 Name: 1-8edge.dat
// 0 Author: James Jessiman
// 0 !LDRAW_ORG Primitive UPDATE 2017-01
// 0 !LICENSE Licensed under CC BY 4.0 : see CAreadme.txt
// 
// 0 BFC CERTIFY CCW
  [0,"BFC","CERTIFY"],
  [0,"BFC","CCW"],
// 
// 0 !HISTORY 2007-06-22 [PTadmin] Header formatted for Contributor Agreement
// 0 !HISTORY 2008-07-01 [PTadmin] Official Update 2008-01
// 0 !HISTORY 2017-01-15 [Steffen] BFCed
// 0 !HISTORY 2017-12-30 [PTadmin] Official Update 2017-01
// 
// 
// 2 24 1 0 0 0.9239 0 0.3827
  [2,24,1,0,0,0.9239,0,0.3827],
// 2 24 0.9239 0 0.3827 0.7071 0 0.7071
  [2,24,0.9239,0,0.3827,0.7071,0,0.7071],
];
module ldraw_lib__1_8edge(step=0, col=false, unit=2/5, alt=false, line=0.2, solid=!$preview)
    makepoly(ldraw_lib__1_8edge(), step=step, col=col, unit=unit, alt=alt, line=line, solid=solid);
ldraw_lib__1_8edge(line=0.2);
// file: ../p/1-8chrd.scad
use <../lib.scad>
function ldraw_lib__1_8chrd() = [
// 0 Chord 0.125
// 0 Name: 1-8chrd.dat
// 0 Author: Orion Pobursky [OrionP]
// 0 !LDRAW_ORG Primitive UPDATE 2023-05
// 0 !LICENSE Licensed under CC BY 4.0 : see CAreadme.txt
// 
// 0 BFC CERTIFY CCW
  [0,"BFC","CERTIFY"],
  [0,"BFC","CCW"],
// 
// 0 !HISTORY 2004-04-22 [PTadmin] Official Update 2004-02
// 0 !HISTORY 2007-06-22 [PTadmin] Header formatted for Contributor Agreement
// 0 !HISTORY 2008-07-01 [PTadmin] Official Update 2008-01
// 0 !HISTORY 2023-10-27 [OrionP] Rebuilt with PrimGen2, original author westrate
// 0 !HISTORY 2023-10-31 [OrionP] Official Update 2023-05
// 
// 3 16 1 0 0 0.9239 0 0.3827 0.7071 0 0.7071
  [3,16,1,0,0,0.9239,0,0.3827,0.7071,0,0.7071],
];
module ldraw_lib__1_8chrd(step=0, col=false, unit=2/5, alt=false, line=0.2, solid=!$preview)
    makepoly(ldraw_lib__1_8chrd(), step=step, col=col, unit=unit, alt=alt, line=line, solid=solid);
ldraw_lib__1_8chrd(line=0.2);
// main file
use <../lib.scad>
use <../p/1-8chrd.scad>
use <../p/1-8edge.scad>
use <../p/2-4cylo.scad>
use <../p/2-4ndis.scad>
use <../p/2-4ring6.scad>
use <../p/3-8cyli.scad>
use <../p/4-4cyli.scad>
use <../p/4-4edge.scad>
use <../p/4-4ring4.scad>
use <../p/peghole.scad>
use <../p/rect3.scad>
function ldraw_lib__62462() = [
// 0 Technic Pin Joiner Round with Slot
// 0 Name: 62462.dat
// 0 Author: Philippe Hurbain [Philo]
// 0 !LDRAW_ORG Part UPDATE 2024-11
// 0 !LICENSE Licensed under CC BY 4.0 : see CAreadme.txt
// 
// 0 BFC CERTIFY CCW
  [0,"BFC","CERTIFY"],
  [0,"BFC","CCW"],
// 
// 0 !HISTORY 2009-09-03 [PTadmin] Official Update 2009-02
// 0 !HISTORY 2021-02-14 [Philo] Increased outer diameter to 10LDU
// 0 !HISTORY 2024-12-30 [OrionP] Official Update 2024-11
// 
// 
// 1 16 2 0 0 0 1 0 0 0 -6 6 0 0 4-4edge.dat
  [1,16,2,0,0,0,1,0,0,0,-6,6,0,0, ldraw_lib__4_4edge()],
// 1 16 20 0 0 0 -18 0 10 0 0 0 0 10 4-4cyli.dat
  [1,16,20,0,0,0,-18,0,10,0,0,0,0,10, ldraw_lib__4_4cyli()],
// 0 BFC INVERTNEXT
  [0,"BFC","INVERTNEXT"],
// 1 16 18 0 0 0 -16 0 6 0 0 0 0 6 4-4cyli.dat
  [1,16,18,0,0,0,-16,0,6,0,0,0,0,6, ldraw_lib__4_4cyli()],
// 1 16 20 0 0 0 -1 0 1 0 0 0 0 1 peghole.dat
  [1,16,20,0,0,0,-1,0,1,0,0,0,0,1, ldraw_lib__peghole()],
// 1 16 20 0 0 0 -1 0 2 0 0 0 0 2 4-4ring4.dat
  [1,16,20,0,0,0,-1,0,2,0,0,0,0,2, ldraw_lib__4_4ring4()],
// 1 16 20 0 0 0 -1 0 10 0 0 0 0 10 4-4edge.dat
  [1,16,20,0,0,0,-1,0,10,0,0,0,0,10, ldraw_lib__4_4edge()],
// 1 16 2 0 0 0 1 0 0 0 1 1 0 0 2-4ring6.dat
  [1,16,2,0,0,0,1,0,0,0,1,1,0,0, ldraw_lib__2_4ring6()],
// 0 BFC INVERTNEXT
  [0,"BFC","INVERTNEXT"],
// 1 16 -2 0 0 0 4 0 0 0 7 -7 0 0 2-4cylo.dat
  [1,16,-2,0,0,0,4,0,0,0,7,-7,0,0, ldraw_lib__2_4cylo()],
// 1 16 2 0 0 0 1 0 0 0 -6 6 0 0 2-4ndis.dat
  [1,16,2,0,0,0,1,0,0,0,-6,6,0,0, ldraw_lib__2_4ndis()],
// 1 16 2 0 0 0 -1 0 -10 0 0 0 0 10 1-8edge.dat
  [1,16,2,0,0,0,-1,0,-10,0,0,0,0,10, ldraw_lib__1_8edge()],
// 1 16 2 0 0 0 1 0 -10 0 0 0 0 10 1-8chrd.dat
  [1,16,2,0,0,0,1,0,-10,0,0,0,0,10, ldraw_lib__1_8chrd()],
// 4 16 2 -7.071 7.071 2 0 7 2 0 6 2 -6 6
  [4,16,2,-7.071,7.071,2,0,7,2,0,6,2,-6,6],
// 4 16 2 -10 0 2 -7.071 7.071 2 -6 6 2 -6 0
  [4,16,2,-10,0,2,-7.071,7.071,2,-6,6,2,-6,0],
// 1 16 2 0 0 0 -1 0 -10 0 0 0 0 -10 1-8edge.dat
  [1,16,2,0,0,0,-1,0,-10,0,0,0,0,-10, ldraw_lib__1_8edge()],
// 1 16 2 0 0 0 1 0 -10 0 0 0 0 -10 1-8chrd.dat
  [1,16,2,0,0,0,1,0,-10,0,0,0,0,-10, ldraw_lib__1_8chrd()],
// 4 16 2 0 -6 2 0 -7 2 -7.071 -7.071 2 -6 -6
  [4,16,2,0,-6,2,0,-7,2,-7.071,-7.071,2,-6,-6],
// 4 16 2 -6 -6 2 -7.071 -7.071 2 -10 0 2 -6 0
  [4,16,2,-6,-6,2,-7.071,-7.071,2,-10,0,2,-6,0],
// 1 16 -2 0 0 0 -1 0 0 0 -6 6 0 0 4-4edge.dat
  [1,16,-2,0,0,0,-1,0,0,0,-6,6,0,0, ldraw_lib__4_4edge()],
// 1 16 -20 0 0 0 18 0 10 0 0 0 0 10 4-4cyli.dat
  [1,16,-20,0,0,0,18,0,10,0,0,0,0,10, ldraw_lib__4_4cyli()],
// 0 BFC INVERTNEXT
  [0,"BFC","INVERTNEXT"],
// 1 16 -18 0 0 0 16 0 6 0 0 0 0 6 4-4cyli.dat
  [1,16,-18,0,0,0,16,0,6,0,0,0,0,6, ldraw_lib__4_4cyli()],
// 1 16 -20 0 0 0 1 0 1 0 0 0 0 1 peghole.dat
  [1,16,-20,0,0,0,1,0,1,0,0,0,0,1, ldraw_lib__peghole()],
// 1 16 -20 0 0 0 1 0 2 0 0 0 0 2 4-4ring4.dat
  [1,16,-20,0,0,0,1,0,2,0,0,0,0,2, ldraw_lib__4_4ring4()],
// 1 16 -20 0 0 0 1 0 10 0 0 0 0 10 4-4edge.dat
  [1,16,-20,0,0,0,1,0,10,0,0,0,0,10, ldraw_lib__4_4edge()],
// 1 16 -2 0 0 0 -1 0 0 0 1 1 0 0 2-4ring6.dat
  [1,16,-2,0,0,0,-1,0,0,0,1,1,0,0, ldraw_lib__2_4ring6()],
// 1 16 -2 0 0 0 -1 0 0 0 -6 6 0 0 2-4ndis.dat
  [1,16,-2,0,0,0,-1,0,0,0,-6,6,0,0, ldraw_lib__2_4ndis()],
// 1 16 -2 0 0 0 1 0 -10 0 0 0 0 10 1-8edge.dat
  [1,16,-2,0,0,0,1,0,-10,0,0,0,0,10, ldraw_lib__1_8edge()],
// 1 16 -2 0 0 0 -1 0 -10 0 0 0 0 10 1-8chrd.dat
  [1,16,-2,0,0,0,-1,0,-10,0,0,0,0,10, ldraw_lib__1_8chrd()],
// 4 16 -2 0 6 -2 0 7 -2 -7.071 7.071 -2 -6 6
  [4,16,-2,0,6,-2,0,7,-2,-7.071,7.071,-2,-6,6],
// 4 16 -2 -6 6 -2 -7.071 7.071 -2 -10 0 -2 -6 0
  [4,16,-2,-6,6,-2,-7.071,7.071,-2,-10,0,-2,-6,0],
// 1 16 -2 0 0 0 1 0 -10 0 0 0 0 -10 1-8edge.dat
  [1,16,-2,0,0,0,1,0,-10,0,0,0,0,-10, ldraw_lib__1_8edge()],
// 1 16 -2 0 0 0 -1 0 -10 0 0 0 0 -10 1-8chrd.dat
  [1,16,-2,0,0,0,-1,0,-10,0,0,0,0,-10, ldraw_lib__1_8chrd()],
// 4 16 -2 -7.071 -7.071 -2 0 -7 -2 0 -6 -2 -6 -6
  [4,16,-2,-7.071,-7.071,-2,0,-7,-2,0,-6,-2,-6,-6],
// 4 16 -2 -10 0 -2 -7.071 -7.071 -2 -6 -6 -2 -6 0
  [4,16,-2,-10,0,-2,-7.071,-7.071,-2,-6,-6,-2,-6,0],
// 1 16 0 -3.5355 -7.0355 -2 0 0 0 0 -3.5355 0 -1 -0.0355 rect3.dat
  [1,16,0,-3.5355,-7.0355,-2,0,0,0,0,-3.5355,0,-1,-0.0355, ldraw_lib__rect3()],
// 1 16 2 0 0 0 -4 0 10 0 0 0 0 -10 3-8cyli.dat
  [1,16,2,0,0,0,-4,0,10,0,0,0,0,-10, ldraw_lib__3_8cyli()],
// 1 16 0 -3.5355 7.0355 2 0 0 0 0 -3.5355 0 1 0.0355 rect3.dat
  [1,16,0,-3.5355,7.0355,2,0,0,0,0,-3.5355,0,1,0.0355, ldraw_lib__rect3()],
// 1 16 2 0 0 0 -4 0 10 0 0 0 0 10 3-8cyli.dat
  [1,16,2,0,0,0,-4,0,10,0,0,0,0,10, ldraw_lib__3_8cyli()],
];
module ldraw_lib__62462(step=0, col=false, unit=2/5, alt=false, line=0.2, solid=!$preview)
    makepoly(ldraw_lib__62462(), step=step, col=col, unit=unit, alt=alt, line=line, solid=solid);
ldraw_lib__62462(line=0.2);
